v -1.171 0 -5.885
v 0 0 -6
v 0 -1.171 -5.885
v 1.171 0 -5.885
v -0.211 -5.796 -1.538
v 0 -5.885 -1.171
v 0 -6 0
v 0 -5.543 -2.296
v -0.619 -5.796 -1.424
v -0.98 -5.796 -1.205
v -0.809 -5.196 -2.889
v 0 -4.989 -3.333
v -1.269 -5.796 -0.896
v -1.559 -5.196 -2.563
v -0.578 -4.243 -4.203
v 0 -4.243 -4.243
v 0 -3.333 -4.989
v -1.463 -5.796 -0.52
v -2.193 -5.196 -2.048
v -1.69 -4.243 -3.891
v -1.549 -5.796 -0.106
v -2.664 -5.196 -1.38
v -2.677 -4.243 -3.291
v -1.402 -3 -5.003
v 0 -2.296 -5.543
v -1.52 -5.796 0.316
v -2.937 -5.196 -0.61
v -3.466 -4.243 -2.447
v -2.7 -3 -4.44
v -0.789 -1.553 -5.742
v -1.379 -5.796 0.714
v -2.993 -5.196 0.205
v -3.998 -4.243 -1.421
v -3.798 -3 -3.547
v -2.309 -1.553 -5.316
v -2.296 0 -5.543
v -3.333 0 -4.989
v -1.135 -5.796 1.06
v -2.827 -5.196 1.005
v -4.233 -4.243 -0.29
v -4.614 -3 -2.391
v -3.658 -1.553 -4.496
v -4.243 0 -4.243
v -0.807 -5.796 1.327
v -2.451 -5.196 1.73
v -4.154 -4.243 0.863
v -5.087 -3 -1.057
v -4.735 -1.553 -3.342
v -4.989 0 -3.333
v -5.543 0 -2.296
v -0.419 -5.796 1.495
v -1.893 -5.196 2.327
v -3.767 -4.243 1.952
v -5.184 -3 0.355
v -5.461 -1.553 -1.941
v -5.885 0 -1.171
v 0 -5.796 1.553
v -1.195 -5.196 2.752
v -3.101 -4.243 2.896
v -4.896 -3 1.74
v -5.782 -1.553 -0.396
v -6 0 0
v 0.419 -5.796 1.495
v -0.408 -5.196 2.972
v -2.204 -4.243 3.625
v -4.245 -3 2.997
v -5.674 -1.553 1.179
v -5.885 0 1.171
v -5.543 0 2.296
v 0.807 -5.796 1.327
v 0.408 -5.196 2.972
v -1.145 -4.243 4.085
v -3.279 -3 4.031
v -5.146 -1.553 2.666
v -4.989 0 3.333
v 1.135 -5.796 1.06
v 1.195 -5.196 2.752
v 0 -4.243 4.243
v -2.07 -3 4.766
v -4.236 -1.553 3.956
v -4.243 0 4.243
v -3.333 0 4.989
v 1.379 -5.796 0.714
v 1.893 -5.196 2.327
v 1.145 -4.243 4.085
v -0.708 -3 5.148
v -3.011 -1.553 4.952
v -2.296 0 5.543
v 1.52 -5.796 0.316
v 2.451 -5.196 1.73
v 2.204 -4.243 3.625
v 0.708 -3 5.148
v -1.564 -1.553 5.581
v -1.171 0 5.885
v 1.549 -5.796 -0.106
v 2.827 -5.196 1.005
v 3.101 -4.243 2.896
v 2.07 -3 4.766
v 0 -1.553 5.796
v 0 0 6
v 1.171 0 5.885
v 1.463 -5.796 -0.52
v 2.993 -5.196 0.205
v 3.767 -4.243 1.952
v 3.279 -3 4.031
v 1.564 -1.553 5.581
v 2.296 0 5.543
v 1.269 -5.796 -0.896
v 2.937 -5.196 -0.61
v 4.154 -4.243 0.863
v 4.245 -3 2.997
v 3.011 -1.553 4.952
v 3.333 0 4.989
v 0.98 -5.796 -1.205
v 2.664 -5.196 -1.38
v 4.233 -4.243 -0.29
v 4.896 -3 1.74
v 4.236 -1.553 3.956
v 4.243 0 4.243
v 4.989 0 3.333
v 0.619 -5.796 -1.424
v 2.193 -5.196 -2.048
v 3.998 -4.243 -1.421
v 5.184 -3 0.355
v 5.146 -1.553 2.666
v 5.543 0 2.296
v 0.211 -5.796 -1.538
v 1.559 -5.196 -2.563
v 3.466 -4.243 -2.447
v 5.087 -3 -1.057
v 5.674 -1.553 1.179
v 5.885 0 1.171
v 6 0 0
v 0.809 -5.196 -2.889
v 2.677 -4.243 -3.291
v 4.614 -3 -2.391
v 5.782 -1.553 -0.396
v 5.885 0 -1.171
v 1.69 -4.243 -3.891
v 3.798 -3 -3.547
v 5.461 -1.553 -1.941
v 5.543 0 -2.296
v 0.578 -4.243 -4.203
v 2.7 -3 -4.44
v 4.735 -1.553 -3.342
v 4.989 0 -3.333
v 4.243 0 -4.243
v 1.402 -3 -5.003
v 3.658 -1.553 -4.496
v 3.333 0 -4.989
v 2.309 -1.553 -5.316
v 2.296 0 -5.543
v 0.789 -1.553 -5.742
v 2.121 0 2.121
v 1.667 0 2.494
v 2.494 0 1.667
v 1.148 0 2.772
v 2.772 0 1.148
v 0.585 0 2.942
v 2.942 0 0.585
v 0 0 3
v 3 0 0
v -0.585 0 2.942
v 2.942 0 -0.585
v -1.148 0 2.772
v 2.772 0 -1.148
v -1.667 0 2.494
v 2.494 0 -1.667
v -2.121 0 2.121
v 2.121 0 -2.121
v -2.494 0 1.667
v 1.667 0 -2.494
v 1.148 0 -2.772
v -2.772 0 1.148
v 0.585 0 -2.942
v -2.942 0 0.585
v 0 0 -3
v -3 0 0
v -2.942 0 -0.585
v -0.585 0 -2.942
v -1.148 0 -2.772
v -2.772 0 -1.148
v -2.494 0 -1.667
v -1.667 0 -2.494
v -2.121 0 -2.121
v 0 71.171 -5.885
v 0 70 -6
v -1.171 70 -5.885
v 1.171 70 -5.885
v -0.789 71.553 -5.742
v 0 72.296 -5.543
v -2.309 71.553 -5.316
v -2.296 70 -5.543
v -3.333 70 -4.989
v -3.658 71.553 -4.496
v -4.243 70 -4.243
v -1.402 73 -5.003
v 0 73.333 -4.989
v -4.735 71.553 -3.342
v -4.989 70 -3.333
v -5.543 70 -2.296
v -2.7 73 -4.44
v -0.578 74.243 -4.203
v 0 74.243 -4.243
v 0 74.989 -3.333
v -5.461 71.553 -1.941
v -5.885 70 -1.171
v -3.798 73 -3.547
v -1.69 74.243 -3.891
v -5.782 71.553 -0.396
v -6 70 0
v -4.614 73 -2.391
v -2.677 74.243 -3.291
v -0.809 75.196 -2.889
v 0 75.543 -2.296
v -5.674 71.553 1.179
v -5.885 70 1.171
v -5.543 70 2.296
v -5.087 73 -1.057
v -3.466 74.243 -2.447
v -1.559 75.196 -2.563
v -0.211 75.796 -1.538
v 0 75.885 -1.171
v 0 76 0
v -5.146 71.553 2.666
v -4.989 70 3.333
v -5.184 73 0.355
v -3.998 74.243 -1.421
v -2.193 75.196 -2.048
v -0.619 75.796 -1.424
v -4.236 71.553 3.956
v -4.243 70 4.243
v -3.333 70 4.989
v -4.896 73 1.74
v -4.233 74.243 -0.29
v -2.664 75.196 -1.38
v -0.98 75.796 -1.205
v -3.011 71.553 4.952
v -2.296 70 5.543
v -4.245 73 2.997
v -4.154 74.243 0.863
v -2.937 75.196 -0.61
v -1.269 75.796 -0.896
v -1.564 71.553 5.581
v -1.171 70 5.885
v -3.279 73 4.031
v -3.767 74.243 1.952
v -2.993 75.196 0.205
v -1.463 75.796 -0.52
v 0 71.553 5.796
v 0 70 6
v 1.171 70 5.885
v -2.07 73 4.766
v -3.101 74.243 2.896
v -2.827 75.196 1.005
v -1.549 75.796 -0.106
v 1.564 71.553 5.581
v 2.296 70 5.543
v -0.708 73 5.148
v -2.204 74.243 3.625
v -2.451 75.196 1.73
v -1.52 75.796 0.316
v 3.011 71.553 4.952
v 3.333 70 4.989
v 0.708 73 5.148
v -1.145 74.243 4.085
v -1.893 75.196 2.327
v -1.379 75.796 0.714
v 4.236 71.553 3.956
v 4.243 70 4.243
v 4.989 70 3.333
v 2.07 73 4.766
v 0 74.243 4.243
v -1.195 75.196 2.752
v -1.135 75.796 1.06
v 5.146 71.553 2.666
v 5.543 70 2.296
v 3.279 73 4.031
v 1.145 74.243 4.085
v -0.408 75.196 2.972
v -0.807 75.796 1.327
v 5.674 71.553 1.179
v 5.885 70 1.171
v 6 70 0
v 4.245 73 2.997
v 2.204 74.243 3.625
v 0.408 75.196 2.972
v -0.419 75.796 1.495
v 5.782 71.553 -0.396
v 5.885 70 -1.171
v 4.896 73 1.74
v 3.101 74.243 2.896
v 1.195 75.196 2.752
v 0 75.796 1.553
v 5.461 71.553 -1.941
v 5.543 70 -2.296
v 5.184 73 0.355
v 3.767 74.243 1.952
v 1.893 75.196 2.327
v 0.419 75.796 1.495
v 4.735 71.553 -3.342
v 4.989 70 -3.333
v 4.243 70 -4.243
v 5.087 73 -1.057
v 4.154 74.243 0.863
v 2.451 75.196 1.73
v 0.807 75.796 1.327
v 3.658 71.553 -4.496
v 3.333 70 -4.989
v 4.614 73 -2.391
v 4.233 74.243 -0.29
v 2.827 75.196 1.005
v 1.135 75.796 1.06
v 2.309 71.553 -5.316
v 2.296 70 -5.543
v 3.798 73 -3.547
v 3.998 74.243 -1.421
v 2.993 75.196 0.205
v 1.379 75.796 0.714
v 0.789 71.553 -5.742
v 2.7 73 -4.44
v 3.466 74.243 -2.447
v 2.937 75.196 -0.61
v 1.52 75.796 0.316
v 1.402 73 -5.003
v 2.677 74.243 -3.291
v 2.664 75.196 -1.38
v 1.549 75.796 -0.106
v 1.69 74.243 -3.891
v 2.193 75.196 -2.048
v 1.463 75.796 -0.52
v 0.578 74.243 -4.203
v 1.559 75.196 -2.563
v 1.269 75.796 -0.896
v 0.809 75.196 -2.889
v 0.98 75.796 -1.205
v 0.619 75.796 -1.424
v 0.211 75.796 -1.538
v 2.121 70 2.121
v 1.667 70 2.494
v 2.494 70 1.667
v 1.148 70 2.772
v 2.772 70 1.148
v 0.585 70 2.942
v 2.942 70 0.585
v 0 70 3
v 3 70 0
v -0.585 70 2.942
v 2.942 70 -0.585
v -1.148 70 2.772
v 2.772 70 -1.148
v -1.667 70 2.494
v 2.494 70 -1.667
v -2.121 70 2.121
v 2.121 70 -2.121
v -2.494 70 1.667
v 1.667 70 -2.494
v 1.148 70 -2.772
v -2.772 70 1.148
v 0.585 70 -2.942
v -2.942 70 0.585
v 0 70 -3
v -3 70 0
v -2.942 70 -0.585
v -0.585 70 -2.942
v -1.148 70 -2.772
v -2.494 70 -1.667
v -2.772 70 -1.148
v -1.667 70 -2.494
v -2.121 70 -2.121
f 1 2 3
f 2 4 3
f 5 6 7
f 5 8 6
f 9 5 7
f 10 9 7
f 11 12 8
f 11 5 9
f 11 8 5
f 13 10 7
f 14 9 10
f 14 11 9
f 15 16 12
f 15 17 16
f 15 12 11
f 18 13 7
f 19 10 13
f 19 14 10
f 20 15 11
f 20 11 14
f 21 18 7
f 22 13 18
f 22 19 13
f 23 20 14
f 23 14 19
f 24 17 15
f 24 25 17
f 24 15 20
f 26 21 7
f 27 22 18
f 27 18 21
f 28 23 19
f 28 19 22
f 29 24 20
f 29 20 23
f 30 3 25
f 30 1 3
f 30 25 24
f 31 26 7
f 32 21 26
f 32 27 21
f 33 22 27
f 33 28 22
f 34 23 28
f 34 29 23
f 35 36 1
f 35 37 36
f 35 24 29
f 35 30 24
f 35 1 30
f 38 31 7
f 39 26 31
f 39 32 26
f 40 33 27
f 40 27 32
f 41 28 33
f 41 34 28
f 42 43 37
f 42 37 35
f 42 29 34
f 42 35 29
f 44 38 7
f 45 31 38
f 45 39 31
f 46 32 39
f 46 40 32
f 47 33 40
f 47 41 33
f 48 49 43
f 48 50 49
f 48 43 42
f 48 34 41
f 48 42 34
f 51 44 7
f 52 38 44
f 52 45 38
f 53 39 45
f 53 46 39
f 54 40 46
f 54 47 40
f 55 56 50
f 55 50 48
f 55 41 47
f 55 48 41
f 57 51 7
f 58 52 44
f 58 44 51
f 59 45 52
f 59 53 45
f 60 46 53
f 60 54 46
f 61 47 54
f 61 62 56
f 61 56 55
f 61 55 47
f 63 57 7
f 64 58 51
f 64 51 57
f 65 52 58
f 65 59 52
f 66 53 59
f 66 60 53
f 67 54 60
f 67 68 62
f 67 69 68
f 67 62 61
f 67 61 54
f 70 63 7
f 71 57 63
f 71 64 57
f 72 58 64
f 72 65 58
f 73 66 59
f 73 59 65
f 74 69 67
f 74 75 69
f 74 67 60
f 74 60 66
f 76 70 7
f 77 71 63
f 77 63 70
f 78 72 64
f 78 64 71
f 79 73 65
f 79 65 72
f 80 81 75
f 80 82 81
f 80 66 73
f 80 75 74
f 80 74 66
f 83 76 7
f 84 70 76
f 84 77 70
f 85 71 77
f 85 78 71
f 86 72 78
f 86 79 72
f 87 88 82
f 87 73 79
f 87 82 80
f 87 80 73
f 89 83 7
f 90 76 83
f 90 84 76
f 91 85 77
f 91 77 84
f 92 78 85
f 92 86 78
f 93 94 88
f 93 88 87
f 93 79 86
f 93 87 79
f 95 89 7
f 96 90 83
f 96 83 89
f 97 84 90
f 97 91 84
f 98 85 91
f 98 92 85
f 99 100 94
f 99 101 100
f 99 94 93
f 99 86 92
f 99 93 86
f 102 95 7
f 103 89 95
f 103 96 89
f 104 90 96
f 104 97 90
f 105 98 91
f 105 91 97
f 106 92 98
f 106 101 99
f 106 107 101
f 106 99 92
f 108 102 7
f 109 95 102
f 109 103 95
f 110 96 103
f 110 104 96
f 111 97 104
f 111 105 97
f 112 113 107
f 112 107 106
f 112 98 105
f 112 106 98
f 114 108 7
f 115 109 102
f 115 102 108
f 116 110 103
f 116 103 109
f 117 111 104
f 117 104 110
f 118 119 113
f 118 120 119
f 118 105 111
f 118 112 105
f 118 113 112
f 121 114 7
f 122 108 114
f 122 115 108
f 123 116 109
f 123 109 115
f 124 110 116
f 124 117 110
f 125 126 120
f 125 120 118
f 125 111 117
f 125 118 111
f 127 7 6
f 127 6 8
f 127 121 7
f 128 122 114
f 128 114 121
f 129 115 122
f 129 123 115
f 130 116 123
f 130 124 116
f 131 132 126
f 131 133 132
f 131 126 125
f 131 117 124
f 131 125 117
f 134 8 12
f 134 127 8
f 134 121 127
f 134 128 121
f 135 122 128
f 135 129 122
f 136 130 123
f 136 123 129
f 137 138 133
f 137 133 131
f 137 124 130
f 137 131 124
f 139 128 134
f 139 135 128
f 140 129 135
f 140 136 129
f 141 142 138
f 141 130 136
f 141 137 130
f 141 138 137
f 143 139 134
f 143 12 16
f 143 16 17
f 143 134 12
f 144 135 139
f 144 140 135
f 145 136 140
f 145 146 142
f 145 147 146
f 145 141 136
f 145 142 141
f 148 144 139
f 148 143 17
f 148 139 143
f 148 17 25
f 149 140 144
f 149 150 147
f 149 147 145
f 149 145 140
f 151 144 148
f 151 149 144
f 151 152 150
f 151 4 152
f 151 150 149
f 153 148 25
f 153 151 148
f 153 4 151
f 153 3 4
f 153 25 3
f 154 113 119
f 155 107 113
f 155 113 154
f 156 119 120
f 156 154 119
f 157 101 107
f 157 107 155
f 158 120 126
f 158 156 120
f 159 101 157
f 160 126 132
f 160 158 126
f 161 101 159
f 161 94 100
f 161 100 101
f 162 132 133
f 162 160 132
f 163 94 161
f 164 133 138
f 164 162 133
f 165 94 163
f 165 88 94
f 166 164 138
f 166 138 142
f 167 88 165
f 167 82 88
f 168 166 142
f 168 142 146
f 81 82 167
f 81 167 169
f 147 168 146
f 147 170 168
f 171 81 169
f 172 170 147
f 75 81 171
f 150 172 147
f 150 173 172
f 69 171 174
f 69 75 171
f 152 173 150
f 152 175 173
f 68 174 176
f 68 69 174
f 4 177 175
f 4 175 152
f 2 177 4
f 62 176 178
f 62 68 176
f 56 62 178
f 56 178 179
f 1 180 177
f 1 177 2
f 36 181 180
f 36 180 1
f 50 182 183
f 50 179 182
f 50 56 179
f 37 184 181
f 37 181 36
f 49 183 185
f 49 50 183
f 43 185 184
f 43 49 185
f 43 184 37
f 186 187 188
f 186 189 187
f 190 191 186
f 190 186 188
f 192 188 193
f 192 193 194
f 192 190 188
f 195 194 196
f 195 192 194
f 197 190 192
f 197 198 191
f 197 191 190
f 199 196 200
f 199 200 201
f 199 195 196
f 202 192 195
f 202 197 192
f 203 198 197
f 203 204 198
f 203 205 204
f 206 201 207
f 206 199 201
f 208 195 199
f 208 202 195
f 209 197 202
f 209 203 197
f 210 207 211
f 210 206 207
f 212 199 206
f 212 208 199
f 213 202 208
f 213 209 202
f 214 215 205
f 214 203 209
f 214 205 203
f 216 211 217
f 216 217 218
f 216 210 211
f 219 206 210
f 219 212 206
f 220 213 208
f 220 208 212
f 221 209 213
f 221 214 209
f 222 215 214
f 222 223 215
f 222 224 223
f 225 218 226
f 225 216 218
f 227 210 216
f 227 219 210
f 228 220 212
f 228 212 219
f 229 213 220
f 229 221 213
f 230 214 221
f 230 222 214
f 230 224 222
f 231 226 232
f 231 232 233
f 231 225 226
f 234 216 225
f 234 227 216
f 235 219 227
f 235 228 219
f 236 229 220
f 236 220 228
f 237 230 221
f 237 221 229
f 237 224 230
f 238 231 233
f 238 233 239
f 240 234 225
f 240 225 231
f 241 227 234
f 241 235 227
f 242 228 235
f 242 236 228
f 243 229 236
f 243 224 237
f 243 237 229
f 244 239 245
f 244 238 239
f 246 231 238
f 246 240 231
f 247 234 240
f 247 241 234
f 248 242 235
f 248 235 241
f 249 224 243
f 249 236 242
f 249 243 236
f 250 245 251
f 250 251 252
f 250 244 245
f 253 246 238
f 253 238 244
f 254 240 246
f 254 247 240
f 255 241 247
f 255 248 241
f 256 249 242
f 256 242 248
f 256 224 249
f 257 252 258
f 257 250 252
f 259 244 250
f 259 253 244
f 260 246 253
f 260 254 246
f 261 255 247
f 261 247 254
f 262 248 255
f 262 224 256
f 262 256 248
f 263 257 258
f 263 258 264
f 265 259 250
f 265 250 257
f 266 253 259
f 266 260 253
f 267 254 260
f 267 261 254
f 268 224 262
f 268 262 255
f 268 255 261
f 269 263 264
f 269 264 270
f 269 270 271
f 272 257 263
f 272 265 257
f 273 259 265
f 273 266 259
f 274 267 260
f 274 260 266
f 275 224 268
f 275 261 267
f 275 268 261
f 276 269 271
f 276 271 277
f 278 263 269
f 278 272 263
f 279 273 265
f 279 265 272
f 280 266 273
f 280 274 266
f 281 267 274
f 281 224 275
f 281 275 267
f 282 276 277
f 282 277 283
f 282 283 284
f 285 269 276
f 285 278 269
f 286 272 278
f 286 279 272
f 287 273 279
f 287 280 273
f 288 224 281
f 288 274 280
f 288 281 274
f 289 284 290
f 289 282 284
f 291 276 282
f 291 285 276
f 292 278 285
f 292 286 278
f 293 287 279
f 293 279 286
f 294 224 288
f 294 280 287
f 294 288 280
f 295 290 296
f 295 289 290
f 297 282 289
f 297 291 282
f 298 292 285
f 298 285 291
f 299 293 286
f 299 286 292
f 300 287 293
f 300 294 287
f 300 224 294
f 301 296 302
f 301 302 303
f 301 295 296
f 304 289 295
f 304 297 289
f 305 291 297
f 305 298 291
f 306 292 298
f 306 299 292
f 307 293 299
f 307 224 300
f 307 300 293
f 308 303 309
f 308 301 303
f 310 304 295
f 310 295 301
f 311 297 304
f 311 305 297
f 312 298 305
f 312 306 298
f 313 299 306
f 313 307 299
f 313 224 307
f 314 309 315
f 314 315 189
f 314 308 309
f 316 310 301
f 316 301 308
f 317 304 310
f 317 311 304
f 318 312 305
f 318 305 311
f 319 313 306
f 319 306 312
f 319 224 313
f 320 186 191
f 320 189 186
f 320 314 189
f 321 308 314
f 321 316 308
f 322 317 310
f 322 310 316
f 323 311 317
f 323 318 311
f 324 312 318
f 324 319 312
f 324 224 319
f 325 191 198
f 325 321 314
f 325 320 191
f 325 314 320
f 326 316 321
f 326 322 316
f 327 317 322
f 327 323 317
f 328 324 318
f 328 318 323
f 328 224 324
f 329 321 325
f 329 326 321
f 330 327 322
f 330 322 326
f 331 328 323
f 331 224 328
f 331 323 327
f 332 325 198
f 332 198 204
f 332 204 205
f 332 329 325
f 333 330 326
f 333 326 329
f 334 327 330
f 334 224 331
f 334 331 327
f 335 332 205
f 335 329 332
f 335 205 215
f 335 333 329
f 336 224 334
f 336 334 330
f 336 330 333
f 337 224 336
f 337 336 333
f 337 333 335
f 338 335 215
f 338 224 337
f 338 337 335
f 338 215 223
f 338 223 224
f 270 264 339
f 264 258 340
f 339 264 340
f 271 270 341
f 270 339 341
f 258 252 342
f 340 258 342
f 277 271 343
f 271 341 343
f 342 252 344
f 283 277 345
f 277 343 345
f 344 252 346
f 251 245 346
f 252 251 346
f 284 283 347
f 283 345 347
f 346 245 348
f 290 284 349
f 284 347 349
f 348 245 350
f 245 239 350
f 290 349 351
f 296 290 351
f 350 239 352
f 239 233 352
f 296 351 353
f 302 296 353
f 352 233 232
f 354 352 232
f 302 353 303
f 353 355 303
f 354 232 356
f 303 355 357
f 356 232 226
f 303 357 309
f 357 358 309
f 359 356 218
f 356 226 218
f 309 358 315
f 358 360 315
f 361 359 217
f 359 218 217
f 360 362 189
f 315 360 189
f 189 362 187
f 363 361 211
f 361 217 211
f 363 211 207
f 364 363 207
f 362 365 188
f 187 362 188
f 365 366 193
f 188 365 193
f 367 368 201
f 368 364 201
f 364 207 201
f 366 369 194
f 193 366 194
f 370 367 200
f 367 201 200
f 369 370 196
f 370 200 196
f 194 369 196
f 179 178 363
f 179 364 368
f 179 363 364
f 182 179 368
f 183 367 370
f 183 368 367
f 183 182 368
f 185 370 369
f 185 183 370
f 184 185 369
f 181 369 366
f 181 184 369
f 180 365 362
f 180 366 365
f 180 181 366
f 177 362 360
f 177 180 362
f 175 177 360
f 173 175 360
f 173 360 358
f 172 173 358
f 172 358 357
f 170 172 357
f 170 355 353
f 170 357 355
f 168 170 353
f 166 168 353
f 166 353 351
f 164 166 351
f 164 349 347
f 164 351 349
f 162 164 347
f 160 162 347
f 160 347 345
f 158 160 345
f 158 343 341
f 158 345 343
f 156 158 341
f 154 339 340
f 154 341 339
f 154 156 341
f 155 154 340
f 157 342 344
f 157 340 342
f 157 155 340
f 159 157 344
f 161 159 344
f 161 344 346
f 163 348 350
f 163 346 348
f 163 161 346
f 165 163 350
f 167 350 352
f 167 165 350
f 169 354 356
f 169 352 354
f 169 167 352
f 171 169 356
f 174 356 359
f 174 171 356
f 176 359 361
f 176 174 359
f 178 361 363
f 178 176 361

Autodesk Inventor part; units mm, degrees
ref_plane "YZ Plane" through (0, 0, 0) normal (1, 0, 0) x (0, 1, 0)
ref_plane "XZ Plane" through (0, 0, 0) normal (0, 1, 0) x (-1, 0, 0)
ref_plane "XY Plane" through (0, 0, 0) normal (0, 0, 1) x (1, 0, 0)
sketch "Sketch1" plane through (0, 0, 0) normal (0, 1, 0) x (-1, 0, 0)
  circle A0 centre (0, 0) radius 3
  dimension "d0" = 6
extrude "Extrusion1" add sketch "Sketch1" along normal blind 70
sketch "Sketch2" plane through (0, 70, 0) normal (0, 1, 0) x (1, 0, 0)
  point P0 (0, 0)
sketch "Sketch3" plane through (0, 0, 0) normal (1, 0, 0) x (0, 1, 0)
  line L0 (0, 0) -> (0, -9)
  line L1 (0, -3) -> (0, 3) projected
  line L2 (0, 0) -> (-9, 0)
  arc A0 (-9, 0) -> (0, -9) centre (0, 0) ccw
  line L3 (70, -3) -> (70, 3) projected
  arc A1 (70, -9) -> (79, 0) centre (70, 0) ccw
  line L4 (79, 0) -> (70, 0)
  line L5 (70, -9) -> (70, 0)
  dimension "d3" = 9
  dimension "d4" = 9
  dimension "d5" = 9
revolve "Revolution1" add sketch "Sketch3" angle 360 about axis through (0, 79, 0) along (0, -1, 0)
sketch "Sketch4" plane through (0, 0, 0) normal (1, 0, 0) x (0, 1, 0)
  line L0 (0, -10.1336) -> (-13.8396, -10.1336)
  line L1 (-13.8396, -10.1336) -> (-13.8396, 13.3764)
  line L2 (-13.8396, 13.3764) -> (0, 13.3764)
  line L3 (0, 13.3764) -> (0, -10.1336)
  line L4 (70, 9) -> (70, -9) projected
  line L5 (70, -9) -> (70, 12.4499)
  line L6 (70, 12.4499) -> (83.9063, 12.4499)
  line L7 (83.9063, 12.4499) -> (83.9063, -12.3341)
  line L8 (83.9063, -12.3341) -> (70, -9)
  point P0 (0, 0)
extrude "Extrusion2" cut sketch "Sketch4" along normal mid plane 20
sketch "Sketch5" plane through (0, 0, 0) normal (1, 0, 0) x (0, 1, 0)
  line L0 (0, 0) -> (0, -6)
  line L1 (0, -3) -> (0, 3) projected
  line L2 (0, 0) -> (-6, 0)
  arc A0 (-6, 0) -> (0, -6) centre (0, 0) ccw
  line L3 (70, -3) -> (70, 3) projected
  line L4 (70, 0) -> (76, 0)
  line L5 (70, 0) -> (70, -6)
  arc A1 (70, -6) -> (76, 0) centre (70, 0) ccw
  dimension "d9" = 6
  dimension "d10" = 6
  dimension "d11" = 6
  dimension "d12" = 6
revolve "Revolution2" add sketch "Sketch5" angle 360 about axis through (0, 70, 0) along (0, 1, 0)
properties part number "Pino da dobradiça"
